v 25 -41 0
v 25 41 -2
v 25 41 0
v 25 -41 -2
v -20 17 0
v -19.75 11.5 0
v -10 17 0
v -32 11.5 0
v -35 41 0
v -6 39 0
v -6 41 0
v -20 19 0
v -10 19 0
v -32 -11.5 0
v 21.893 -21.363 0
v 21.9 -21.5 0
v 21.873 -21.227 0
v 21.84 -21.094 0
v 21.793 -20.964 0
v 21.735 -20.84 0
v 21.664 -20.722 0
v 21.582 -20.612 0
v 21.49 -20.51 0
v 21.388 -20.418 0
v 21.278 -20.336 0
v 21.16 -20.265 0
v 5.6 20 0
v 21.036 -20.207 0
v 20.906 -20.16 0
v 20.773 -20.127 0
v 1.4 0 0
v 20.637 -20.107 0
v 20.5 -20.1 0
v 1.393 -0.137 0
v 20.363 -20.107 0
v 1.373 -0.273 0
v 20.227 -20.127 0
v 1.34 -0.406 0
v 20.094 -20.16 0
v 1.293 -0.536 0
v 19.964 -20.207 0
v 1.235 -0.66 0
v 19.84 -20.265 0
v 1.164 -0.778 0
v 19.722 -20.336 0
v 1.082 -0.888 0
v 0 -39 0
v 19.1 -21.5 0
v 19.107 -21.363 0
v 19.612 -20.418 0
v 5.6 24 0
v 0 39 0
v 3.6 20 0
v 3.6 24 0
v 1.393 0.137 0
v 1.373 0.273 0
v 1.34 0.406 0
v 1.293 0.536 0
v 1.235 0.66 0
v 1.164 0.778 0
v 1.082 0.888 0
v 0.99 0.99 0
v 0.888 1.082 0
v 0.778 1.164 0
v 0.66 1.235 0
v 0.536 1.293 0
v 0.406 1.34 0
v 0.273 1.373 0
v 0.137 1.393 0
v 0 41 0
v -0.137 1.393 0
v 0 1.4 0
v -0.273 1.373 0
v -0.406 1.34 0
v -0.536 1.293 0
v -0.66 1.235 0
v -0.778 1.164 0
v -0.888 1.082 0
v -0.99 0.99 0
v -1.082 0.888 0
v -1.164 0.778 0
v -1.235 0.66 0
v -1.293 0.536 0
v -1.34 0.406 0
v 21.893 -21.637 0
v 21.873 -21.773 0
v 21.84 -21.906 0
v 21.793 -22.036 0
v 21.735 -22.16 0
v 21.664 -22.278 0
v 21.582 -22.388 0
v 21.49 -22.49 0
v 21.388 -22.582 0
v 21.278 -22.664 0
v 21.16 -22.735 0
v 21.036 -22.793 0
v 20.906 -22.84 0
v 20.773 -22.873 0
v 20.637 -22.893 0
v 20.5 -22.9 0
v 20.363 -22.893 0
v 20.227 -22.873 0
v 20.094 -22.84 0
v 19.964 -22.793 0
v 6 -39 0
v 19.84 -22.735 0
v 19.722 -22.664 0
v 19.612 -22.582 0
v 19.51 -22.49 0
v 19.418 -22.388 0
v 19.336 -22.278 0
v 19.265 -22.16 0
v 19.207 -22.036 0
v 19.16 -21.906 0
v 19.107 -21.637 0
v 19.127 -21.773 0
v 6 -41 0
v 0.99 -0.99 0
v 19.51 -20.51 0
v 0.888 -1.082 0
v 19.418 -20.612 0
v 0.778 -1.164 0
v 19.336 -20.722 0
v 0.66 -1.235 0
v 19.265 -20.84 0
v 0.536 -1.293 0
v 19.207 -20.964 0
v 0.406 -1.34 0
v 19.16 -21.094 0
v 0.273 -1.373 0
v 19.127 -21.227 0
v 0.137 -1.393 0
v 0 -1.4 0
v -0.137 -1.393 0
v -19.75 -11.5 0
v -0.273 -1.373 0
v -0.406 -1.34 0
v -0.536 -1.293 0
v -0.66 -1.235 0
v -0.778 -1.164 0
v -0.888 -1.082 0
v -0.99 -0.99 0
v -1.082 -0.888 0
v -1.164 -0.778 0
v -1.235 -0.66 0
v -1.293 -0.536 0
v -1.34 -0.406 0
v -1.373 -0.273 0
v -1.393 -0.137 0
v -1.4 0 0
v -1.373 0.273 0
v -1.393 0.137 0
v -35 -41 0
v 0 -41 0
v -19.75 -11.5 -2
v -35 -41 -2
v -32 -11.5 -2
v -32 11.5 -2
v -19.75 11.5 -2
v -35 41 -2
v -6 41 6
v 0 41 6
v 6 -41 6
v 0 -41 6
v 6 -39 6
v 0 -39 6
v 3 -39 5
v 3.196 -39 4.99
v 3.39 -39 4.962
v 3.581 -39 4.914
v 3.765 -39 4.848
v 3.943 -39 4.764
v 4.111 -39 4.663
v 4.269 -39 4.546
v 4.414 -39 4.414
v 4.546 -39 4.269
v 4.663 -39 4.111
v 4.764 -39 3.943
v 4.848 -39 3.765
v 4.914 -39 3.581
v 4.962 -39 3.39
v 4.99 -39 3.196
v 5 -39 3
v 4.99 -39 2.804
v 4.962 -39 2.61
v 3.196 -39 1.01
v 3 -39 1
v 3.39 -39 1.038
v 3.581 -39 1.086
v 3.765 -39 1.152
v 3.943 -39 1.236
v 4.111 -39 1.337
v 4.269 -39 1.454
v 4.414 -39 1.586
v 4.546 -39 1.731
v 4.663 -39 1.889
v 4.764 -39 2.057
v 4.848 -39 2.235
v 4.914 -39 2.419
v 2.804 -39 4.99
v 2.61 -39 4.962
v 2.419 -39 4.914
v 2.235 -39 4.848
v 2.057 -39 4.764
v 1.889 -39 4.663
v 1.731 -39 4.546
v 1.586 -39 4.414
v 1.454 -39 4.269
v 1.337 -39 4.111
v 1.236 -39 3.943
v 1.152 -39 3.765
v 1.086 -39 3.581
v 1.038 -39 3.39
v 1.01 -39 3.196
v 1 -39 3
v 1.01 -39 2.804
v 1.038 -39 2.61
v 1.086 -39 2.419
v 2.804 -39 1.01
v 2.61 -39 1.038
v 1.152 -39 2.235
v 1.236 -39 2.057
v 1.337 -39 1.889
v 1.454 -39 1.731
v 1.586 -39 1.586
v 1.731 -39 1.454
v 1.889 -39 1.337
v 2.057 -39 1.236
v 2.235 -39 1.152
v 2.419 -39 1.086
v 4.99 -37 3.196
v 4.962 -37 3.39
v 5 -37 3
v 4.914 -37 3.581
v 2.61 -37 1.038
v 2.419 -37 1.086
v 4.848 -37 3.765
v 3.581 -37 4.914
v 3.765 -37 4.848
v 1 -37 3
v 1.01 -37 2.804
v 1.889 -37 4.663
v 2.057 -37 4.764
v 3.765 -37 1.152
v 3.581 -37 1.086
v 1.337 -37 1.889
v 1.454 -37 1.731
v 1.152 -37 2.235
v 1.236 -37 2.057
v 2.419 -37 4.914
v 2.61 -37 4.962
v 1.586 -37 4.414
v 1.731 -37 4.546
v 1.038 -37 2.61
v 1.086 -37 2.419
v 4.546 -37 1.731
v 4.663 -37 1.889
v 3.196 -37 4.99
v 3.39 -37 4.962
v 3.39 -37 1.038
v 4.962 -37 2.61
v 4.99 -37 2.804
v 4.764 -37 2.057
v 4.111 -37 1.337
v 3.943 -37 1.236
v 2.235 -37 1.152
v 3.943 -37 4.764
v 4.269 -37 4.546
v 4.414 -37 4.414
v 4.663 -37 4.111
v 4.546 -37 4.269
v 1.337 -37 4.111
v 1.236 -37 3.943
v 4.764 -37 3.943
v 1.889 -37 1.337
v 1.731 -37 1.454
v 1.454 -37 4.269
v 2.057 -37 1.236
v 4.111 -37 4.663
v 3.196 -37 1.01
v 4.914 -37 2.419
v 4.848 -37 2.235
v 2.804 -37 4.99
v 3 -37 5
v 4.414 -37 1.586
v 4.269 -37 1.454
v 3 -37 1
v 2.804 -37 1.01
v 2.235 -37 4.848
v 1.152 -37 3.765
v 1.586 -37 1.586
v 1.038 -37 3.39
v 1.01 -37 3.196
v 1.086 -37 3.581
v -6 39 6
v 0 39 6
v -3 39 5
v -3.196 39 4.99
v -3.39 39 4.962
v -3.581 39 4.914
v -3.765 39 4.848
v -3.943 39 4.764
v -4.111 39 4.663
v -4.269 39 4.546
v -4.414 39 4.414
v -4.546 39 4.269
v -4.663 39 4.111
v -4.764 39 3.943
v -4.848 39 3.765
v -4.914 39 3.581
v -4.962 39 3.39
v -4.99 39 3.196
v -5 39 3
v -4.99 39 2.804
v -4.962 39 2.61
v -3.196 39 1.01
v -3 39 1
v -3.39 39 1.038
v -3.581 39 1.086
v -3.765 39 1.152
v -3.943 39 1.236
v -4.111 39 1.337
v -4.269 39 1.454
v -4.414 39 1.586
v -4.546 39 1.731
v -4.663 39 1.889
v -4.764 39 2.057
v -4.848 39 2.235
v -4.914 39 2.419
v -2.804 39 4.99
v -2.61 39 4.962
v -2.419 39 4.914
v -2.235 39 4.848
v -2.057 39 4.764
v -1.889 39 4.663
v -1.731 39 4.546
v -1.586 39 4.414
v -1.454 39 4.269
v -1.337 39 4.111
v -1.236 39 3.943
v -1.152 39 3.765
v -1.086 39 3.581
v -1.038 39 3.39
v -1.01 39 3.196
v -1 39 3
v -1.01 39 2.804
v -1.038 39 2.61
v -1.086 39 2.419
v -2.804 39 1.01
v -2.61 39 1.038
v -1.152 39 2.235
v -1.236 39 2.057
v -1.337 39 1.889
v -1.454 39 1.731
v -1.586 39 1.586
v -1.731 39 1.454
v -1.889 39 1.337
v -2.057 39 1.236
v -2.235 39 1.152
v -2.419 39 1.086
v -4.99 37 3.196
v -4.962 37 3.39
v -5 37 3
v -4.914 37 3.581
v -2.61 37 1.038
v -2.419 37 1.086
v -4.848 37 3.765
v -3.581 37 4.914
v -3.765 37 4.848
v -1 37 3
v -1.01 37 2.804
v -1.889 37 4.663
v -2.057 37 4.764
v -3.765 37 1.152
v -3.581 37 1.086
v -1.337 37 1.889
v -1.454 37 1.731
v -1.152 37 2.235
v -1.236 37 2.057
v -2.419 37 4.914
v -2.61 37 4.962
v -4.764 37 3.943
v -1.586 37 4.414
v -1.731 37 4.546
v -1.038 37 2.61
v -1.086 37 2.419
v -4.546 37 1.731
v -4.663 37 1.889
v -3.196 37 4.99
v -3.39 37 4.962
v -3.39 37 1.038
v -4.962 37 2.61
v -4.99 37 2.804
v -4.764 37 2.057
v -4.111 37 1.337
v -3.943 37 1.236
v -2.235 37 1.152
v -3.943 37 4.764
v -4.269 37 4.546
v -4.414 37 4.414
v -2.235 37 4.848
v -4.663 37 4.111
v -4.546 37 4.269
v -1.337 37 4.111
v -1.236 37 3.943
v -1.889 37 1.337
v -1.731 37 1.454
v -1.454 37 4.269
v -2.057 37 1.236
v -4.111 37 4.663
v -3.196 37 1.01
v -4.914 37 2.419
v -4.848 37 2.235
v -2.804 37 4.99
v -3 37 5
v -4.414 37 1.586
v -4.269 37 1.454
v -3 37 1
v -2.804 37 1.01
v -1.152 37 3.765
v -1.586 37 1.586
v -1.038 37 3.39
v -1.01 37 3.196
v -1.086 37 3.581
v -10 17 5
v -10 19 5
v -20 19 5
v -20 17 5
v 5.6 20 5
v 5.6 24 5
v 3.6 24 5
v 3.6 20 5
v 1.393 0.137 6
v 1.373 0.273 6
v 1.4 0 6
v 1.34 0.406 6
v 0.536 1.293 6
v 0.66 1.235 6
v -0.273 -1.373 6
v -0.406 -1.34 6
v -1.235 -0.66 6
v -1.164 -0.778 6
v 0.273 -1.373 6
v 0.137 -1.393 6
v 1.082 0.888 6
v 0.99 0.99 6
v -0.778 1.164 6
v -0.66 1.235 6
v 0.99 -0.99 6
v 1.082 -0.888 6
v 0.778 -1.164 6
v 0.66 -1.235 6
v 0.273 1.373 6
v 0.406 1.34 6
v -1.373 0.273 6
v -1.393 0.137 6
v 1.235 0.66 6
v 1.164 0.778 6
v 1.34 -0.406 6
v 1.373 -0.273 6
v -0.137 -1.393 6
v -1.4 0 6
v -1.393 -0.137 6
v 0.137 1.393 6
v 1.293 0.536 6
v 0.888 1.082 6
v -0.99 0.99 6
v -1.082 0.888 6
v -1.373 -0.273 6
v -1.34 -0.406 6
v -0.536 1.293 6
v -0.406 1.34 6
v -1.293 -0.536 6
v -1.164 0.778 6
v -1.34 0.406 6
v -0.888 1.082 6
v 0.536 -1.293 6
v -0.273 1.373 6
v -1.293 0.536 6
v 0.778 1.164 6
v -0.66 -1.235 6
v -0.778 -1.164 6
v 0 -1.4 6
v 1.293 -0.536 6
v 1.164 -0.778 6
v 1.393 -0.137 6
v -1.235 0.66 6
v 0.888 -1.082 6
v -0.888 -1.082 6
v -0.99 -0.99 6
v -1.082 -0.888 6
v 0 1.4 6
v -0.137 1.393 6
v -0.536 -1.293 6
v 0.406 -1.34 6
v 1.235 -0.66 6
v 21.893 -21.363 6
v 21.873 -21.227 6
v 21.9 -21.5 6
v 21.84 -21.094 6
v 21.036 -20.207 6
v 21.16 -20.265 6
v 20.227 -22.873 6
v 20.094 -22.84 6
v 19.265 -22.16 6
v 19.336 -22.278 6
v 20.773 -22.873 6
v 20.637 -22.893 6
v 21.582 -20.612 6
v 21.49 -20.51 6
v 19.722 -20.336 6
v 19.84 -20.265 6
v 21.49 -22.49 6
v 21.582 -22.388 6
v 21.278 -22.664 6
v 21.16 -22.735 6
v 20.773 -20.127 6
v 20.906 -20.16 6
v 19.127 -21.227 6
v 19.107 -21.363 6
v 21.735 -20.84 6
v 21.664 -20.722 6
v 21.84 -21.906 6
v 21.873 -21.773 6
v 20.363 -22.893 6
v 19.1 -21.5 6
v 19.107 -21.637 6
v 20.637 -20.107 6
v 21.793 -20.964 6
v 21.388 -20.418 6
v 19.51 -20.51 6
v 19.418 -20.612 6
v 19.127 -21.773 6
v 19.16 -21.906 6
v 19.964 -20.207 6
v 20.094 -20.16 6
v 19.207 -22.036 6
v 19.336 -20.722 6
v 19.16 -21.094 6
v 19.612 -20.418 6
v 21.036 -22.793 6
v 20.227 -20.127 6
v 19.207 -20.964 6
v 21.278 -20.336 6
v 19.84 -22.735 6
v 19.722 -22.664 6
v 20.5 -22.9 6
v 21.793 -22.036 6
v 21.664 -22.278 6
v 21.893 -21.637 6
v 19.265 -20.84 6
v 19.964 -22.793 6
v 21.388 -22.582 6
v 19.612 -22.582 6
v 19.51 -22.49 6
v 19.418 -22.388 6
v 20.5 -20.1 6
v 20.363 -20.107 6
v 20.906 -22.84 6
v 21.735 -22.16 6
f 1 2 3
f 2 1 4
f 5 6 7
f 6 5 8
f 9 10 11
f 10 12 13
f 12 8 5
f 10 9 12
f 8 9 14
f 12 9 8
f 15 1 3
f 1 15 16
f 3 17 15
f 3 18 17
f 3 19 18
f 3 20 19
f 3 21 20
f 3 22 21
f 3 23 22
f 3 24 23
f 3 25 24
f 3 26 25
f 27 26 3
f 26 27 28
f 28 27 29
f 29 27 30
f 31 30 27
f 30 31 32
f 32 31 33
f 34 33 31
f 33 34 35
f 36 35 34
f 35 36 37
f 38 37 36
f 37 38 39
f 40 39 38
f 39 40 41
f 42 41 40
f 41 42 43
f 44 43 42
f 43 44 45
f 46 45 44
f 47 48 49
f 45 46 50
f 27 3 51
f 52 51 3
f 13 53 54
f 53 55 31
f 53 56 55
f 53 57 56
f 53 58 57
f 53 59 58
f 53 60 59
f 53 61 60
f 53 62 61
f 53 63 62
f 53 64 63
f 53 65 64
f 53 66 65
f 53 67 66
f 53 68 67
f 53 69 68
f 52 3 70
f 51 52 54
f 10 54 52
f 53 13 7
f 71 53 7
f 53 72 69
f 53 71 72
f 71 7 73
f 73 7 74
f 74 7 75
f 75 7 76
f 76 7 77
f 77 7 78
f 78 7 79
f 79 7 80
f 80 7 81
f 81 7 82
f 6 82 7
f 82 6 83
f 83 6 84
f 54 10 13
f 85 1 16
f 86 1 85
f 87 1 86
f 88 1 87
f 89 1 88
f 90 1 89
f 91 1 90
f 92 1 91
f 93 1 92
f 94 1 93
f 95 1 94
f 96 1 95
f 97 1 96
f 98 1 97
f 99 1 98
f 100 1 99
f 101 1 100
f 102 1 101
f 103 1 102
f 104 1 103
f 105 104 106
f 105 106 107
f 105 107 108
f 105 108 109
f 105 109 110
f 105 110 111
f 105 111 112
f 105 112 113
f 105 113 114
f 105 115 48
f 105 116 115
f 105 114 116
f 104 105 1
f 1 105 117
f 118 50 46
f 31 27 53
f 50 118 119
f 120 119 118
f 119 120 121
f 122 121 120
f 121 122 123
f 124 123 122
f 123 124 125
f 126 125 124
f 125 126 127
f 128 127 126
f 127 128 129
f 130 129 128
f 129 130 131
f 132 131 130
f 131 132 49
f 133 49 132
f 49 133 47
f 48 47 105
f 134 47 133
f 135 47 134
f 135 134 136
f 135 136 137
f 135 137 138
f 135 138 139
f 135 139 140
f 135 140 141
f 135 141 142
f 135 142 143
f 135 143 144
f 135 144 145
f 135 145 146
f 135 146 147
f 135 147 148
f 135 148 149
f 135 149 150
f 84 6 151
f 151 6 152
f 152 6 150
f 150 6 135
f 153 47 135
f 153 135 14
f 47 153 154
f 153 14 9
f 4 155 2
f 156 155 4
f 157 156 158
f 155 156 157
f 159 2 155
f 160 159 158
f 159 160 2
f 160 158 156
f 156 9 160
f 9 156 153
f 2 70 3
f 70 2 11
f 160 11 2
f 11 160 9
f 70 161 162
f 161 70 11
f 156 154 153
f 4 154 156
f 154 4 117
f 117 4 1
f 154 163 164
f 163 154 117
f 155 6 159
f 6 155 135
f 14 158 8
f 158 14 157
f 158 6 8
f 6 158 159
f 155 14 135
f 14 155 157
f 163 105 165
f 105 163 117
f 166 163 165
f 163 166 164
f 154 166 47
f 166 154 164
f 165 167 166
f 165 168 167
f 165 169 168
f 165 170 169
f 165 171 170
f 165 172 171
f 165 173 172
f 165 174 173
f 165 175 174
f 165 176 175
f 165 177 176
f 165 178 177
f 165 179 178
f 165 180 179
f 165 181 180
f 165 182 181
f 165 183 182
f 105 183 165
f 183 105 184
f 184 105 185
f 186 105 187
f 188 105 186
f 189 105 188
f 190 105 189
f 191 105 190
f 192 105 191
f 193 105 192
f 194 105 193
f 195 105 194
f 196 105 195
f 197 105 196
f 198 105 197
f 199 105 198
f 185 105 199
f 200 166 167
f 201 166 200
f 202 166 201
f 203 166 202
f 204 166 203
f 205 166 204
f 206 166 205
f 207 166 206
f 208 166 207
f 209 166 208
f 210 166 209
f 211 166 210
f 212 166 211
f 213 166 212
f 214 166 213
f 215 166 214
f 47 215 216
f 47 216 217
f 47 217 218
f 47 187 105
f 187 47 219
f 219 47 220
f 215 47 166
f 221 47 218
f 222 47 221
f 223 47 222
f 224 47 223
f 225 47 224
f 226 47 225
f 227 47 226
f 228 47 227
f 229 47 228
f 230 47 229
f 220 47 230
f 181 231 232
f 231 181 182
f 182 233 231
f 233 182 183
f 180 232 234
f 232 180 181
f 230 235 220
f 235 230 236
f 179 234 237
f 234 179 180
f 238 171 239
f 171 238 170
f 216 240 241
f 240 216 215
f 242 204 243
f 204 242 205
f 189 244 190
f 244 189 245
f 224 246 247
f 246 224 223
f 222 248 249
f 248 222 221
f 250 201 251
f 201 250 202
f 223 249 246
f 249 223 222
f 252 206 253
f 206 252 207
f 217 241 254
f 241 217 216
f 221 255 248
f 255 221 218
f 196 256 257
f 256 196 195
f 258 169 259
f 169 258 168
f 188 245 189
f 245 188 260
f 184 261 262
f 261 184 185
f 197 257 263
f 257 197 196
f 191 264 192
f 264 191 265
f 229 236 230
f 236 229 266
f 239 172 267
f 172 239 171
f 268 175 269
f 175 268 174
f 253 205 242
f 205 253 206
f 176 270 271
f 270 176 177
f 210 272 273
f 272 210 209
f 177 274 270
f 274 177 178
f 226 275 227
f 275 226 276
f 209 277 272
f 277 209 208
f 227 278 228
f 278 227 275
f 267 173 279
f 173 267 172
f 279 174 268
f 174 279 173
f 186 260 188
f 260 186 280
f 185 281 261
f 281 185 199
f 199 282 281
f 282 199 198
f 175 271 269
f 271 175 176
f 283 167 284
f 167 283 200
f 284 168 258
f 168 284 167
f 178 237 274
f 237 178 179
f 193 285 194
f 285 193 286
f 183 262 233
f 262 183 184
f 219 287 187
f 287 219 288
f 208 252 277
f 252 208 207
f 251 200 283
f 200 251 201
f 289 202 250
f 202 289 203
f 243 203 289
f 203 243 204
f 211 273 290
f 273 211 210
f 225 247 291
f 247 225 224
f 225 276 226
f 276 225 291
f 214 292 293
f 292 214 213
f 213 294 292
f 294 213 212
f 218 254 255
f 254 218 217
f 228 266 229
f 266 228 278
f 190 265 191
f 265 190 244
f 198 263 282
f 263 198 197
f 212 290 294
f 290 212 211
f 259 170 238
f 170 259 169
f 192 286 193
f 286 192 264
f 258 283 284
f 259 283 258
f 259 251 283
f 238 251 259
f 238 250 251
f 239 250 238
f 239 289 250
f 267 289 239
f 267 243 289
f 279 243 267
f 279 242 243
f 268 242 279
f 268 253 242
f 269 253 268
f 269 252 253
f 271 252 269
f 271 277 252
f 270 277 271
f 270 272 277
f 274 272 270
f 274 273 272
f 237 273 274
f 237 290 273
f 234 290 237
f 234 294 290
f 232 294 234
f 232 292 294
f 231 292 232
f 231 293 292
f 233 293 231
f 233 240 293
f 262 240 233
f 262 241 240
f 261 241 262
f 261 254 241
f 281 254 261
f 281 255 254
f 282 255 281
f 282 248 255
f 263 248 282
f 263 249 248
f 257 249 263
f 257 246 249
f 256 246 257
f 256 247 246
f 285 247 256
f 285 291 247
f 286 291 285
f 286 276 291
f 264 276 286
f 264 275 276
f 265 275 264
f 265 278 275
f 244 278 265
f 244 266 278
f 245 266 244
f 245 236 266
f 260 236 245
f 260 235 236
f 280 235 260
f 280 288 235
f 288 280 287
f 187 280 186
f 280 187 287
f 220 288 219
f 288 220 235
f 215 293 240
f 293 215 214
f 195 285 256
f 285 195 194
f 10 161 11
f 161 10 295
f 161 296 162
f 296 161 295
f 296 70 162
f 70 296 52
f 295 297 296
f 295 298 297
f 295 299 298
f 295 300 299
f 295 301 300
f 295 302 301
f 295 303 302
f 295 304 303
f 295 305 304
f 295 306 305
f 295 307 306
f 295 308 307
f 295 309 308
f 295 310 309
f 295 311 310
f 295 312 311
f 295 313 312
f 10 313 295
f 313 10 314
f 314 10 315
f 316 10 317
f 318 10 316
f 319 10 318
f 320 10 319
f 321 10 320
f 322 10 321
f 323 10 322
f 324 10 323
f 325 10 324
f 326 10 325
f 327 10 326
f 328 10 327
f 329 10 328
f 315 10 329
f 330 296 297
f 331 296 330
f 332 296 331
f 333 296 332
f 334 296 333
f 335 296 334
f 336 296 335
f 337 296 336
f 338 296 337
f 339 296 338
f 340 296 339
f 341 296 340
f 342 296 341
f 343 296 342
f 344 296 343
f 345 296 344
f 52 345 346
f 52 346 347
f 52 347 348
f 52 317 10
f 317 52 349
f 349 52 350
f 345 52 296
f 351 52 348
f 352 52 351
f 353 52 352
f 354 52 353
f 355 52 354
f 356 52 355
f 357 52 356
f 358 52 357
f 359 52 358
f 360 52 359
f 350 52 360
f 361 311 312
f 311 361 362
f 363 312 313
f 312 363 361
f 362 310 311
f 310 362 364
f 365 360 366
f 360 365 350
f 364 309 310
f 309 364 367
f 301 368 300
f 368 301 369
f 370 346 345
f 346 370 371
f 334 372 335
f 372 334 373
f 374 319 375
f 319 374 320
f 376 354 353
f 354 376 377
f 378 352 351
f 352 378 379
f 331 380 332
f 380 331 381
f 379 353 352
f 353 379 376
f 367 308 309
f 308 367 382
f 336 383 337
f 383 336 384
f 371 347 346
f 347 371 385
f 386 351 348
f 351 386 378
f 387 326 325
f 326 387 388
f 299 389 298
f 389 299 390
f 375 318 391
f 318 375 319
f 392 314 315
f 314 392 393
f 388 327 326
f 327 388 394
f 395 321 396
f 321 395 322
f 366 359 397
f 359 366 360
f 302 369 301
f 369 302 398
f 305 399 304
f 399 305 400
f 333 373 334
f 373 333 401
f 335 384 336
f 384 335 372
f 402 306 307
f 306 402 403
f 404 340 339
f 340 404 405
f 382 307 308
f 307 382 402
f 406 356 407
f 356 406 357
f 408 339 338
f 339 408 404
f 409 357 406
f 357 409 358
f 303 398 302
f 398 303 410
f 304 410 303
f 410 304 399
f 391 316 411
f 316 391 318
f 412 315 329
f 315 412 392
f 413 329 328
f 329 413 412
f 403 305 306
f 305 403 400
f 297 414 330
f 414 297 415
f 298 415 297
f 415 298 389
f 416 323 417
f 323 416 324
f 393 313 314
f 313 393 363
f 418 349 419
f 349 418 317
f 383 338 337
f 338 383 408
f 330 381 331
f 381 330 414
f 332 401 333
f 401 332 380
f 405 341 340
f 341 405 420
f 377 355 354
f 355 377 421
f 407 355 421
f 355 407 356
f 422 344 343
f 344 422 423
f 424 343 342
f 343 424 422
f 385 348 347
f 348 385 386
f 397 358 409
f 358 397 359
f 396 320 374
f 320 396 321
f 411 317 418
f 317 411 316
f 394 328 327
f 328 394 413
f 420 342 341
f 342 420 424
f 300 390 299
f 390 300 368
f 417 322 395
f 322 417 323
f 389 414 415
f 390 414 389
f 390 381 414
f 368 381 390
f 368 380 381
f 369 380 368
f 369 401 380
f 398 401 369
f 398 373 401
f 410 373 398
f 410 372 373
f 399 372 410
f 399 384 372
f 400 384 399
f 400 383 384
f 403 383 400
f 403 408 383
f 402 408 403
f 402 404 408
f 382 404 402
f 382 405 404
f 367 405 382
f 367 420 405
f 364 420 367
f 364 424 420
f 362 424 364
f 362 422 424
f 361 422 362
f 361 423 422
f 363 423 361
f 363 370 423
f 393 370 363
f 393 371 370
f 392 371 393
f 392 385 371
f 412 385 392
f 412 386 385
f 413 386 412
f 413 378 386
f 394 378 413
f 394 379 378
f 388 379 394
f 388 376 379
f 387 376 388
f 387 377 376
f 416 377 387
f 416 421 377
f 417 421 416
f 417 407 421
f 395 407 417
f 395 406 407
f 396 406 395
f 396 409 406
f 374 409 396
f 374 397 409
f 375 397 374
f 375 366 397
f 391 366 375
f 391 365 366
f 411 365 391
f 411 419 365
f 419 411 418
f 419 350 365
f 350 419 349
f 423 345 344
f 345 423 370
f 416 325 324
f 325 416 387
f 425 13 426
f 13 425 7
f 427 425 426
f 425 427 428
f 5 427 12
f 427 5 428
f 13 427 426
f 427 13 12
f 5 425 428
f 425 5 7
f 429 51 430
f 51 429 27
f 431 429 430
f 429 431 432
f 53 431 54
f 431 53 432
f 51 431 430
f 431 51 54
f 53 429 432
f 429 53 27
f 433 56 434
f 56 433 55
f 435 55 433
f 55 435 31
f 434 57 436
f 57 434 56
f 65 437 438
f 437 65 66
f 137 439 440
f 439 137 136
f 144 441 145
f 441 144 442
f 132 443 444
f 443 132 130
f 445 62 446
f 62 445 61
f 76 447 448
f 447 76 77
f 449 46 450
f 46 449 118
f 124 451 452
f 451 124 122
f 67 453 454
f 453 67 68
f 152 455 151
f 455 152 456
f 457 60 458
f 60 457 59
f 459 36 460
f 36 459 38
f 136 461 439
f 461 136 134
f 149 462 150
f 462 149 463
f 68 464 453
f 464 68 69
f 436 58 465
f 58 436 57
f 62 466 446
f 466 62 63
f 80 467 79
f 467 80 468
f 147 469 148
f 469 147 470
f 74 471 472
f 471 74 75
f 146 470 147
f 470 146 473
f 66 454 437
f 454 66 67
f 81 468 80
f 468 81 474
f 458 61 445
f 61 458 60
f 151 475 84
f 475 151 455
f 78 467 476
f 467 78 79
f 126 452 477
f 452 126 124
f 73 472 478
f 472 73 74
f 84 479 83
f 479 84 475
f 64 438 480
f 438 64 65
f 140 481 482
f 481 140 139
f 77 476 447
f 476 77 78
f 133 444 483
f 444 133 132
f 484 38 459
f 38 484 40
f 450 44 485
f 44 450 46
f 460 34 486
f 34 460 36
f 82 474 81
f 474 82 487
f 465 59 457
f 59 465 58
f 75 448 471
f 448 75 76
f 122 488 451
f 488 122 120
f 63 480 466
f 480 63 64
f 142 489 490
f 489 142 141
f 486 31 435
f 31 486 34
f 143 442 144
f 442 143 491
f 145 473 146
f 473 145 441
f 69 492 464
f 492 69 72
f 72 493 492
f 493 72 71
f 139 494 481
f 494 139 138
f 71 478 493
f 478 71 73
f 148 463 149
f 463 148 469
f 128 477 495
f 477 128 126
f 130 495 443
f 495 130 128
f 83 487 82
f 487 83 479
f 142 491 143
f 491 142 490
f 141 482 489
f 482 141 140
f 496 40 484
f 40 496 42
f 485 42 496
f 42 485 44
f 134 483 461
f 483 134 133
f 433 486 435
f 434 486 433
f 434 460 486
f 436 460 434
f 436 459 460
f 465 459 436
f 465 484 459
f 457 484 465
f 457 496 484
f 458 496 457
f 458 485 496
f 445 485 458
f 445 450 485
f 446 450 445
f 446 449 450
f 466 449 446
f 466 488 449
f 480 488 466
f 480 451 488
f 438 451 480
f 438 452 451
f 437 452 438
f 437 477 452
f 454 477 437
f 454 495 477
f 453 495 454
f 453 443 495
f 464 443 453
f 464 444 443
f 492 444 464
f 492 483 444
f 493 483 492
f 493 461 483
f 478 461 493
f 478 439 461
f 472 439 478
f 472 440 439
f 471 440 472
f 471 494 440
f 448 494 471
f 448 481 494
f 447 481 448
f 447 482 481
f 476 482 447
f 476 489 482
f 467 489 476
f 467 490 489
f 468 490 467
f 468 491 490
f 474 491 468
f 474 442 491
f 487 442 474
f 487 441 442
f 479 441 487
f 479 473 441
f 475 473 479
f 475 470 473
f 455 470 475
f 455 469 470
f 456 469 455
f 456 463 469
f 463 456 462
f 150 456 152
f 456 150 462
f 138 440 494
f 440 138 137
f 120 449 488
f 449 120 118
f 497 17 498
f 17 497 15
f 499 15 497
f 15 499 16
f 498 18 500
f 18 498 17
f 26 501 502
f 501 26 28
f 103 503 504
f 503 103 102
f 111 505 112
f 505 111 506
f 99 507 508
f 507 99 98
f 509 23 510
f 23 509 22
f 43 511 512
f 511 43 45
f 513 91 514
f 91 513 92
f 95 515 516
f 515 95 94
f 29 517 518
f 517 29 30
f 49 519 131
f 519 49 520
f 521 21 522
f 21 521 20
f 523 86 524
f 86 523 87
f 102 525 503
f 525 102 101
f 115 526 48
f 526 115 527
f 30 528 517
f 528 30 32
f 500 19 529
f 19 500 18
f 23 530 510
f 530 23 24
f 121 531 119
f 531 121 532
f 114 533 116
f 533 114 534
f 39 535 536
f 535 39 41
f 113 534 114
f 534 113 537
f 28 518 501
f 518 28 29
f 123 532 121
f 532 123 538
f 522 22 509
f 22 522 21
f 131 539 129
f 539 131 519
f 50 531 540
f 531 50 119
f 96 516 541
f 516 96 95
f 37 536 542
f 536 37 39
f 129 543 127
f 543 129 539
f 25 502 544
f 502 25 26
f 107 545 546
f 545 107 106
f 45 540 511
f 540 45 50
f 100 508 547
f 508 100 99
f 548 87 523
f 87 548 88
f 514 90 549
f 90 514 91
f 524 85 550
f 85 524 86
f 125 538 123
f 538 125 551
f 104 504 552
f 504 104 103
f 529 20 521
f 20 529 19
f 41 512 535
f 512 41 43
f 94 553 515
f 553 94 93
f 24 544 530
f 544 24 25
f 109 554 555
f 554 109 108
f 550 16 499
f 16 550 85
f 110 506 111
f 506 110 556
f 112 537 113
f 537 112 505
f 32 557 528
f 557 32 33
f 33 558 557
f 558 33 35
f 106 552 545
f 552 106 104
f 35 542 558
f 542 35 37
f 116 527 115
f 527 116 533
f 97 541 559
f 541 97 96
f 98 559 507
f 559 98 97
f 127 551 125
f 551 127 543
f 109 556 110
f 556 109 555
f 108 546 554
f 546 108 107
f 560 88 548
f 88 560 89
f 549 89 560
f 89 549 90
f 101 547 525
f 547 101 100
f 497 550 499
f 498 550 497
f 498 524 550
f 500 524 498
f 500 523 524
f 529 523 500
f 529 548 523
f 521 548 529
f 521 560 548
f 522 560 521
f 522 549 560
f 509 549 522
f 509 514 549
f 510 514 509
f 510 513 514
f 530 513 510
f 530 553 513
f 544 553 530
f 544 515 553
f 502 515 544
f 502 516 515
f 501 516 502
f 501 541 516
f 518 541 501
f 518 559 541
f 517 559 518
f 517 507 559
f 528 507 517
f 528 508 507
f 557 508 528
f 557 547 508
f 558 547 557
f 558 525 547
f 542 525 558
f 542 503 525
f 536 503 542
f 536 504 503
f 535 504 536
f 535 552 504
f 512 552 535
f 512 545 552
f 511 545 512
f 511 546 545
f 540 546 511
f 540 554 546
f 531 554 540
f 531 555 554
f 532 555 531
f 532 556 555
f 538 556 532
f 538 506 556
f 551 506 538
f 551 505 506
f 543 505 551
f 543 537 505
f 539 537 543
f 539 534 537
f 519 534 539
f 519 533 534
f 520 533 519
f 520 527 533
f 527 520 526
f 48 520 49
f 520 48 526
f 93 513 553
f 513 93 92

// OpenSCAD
$fn=64;

//  color("green") cylinder(r=20,h=0.1);
// difference() {
//   color("green") ratchet(10,32,4);
//   translate([0,0,-0.1]) cylinder(r=1.6,h=4.2);
// }

ad=19;
aad=6;
aa=10;

// color("blue") 
  //translate([-3.3,0,0]) translate([aad,-ad,0]) rotate([0,0,aa]) translate([-aad,ad,0]) 

//translate([3.5,0,-0.2])
  // mirror([0,1,0]) mirror([1,0,0])  powl(10,32,3);


//  powl(10,32,4);


plate();

module plate() {
color("orange") difference() {
  translate([-35,-41,-2]) cube([60,82,2]);
  translate([-32,-23/2,-2.1]) cube([12.25,23,2.2]);
}
translate([-20,17,0]) cube([10,2,5]);
translate([3.6,20,0]) cube([2,4,5]);

translate([0,-41,0]) {
    cube([6,2,6]);
    translate([3,4,3]) rotate([90,0,0]) cylinder(r=2,h=2);
}
mirror([0,1,0]) mirror([1,0,0]) translate([0,-41,0]) {
    cube([6,2,6]);
    translate([3,4,3]) rotate([90,0,0]) cylinder(r=2,h=2);
}

cylinder(r=1.4,h=6);
translate([20.5,-21.5,0]) cylinder(r=1.4,h=6);
}

module ratchet(r,teeth,t) {
  for ( i = [0 : teeth-1] ) {
    rotate([0,0,i*360/teeth]) translate([0,-r,0]) difference() {
      translate([4.5,0,0]) cylinder(r=r,h=t);
      translate([0,-r-0.1,-0.1]) cube([r*2+0.1,r*2+0.2,t+0.2]);
    }
  }
  cylinder(r=r,h=t);
}

module powl(r,teeth,t) {
  a=360/teeth;
  difference() {
    translate([0,-14-r,0]) cube([8,8,t]);
    rotate([0,0,a]) translate([0,-r,0]) translate([4.5,0,-0.1]) cylinder(r=r,h=t+0.2);
  }
  translate([8,-14-r,0]) difference() {
    cube([15,5,t]);
    translate([15-2.5,2.5,-0.1]) cylinder(r=1.6,h=t+02);
  }
  translate([0,-14-r,0]) {
    cube([6,2,6]);
    translate([3,0,3]) rotate([90,0,0]) cylinder(r=2,h=2);
  }

}
